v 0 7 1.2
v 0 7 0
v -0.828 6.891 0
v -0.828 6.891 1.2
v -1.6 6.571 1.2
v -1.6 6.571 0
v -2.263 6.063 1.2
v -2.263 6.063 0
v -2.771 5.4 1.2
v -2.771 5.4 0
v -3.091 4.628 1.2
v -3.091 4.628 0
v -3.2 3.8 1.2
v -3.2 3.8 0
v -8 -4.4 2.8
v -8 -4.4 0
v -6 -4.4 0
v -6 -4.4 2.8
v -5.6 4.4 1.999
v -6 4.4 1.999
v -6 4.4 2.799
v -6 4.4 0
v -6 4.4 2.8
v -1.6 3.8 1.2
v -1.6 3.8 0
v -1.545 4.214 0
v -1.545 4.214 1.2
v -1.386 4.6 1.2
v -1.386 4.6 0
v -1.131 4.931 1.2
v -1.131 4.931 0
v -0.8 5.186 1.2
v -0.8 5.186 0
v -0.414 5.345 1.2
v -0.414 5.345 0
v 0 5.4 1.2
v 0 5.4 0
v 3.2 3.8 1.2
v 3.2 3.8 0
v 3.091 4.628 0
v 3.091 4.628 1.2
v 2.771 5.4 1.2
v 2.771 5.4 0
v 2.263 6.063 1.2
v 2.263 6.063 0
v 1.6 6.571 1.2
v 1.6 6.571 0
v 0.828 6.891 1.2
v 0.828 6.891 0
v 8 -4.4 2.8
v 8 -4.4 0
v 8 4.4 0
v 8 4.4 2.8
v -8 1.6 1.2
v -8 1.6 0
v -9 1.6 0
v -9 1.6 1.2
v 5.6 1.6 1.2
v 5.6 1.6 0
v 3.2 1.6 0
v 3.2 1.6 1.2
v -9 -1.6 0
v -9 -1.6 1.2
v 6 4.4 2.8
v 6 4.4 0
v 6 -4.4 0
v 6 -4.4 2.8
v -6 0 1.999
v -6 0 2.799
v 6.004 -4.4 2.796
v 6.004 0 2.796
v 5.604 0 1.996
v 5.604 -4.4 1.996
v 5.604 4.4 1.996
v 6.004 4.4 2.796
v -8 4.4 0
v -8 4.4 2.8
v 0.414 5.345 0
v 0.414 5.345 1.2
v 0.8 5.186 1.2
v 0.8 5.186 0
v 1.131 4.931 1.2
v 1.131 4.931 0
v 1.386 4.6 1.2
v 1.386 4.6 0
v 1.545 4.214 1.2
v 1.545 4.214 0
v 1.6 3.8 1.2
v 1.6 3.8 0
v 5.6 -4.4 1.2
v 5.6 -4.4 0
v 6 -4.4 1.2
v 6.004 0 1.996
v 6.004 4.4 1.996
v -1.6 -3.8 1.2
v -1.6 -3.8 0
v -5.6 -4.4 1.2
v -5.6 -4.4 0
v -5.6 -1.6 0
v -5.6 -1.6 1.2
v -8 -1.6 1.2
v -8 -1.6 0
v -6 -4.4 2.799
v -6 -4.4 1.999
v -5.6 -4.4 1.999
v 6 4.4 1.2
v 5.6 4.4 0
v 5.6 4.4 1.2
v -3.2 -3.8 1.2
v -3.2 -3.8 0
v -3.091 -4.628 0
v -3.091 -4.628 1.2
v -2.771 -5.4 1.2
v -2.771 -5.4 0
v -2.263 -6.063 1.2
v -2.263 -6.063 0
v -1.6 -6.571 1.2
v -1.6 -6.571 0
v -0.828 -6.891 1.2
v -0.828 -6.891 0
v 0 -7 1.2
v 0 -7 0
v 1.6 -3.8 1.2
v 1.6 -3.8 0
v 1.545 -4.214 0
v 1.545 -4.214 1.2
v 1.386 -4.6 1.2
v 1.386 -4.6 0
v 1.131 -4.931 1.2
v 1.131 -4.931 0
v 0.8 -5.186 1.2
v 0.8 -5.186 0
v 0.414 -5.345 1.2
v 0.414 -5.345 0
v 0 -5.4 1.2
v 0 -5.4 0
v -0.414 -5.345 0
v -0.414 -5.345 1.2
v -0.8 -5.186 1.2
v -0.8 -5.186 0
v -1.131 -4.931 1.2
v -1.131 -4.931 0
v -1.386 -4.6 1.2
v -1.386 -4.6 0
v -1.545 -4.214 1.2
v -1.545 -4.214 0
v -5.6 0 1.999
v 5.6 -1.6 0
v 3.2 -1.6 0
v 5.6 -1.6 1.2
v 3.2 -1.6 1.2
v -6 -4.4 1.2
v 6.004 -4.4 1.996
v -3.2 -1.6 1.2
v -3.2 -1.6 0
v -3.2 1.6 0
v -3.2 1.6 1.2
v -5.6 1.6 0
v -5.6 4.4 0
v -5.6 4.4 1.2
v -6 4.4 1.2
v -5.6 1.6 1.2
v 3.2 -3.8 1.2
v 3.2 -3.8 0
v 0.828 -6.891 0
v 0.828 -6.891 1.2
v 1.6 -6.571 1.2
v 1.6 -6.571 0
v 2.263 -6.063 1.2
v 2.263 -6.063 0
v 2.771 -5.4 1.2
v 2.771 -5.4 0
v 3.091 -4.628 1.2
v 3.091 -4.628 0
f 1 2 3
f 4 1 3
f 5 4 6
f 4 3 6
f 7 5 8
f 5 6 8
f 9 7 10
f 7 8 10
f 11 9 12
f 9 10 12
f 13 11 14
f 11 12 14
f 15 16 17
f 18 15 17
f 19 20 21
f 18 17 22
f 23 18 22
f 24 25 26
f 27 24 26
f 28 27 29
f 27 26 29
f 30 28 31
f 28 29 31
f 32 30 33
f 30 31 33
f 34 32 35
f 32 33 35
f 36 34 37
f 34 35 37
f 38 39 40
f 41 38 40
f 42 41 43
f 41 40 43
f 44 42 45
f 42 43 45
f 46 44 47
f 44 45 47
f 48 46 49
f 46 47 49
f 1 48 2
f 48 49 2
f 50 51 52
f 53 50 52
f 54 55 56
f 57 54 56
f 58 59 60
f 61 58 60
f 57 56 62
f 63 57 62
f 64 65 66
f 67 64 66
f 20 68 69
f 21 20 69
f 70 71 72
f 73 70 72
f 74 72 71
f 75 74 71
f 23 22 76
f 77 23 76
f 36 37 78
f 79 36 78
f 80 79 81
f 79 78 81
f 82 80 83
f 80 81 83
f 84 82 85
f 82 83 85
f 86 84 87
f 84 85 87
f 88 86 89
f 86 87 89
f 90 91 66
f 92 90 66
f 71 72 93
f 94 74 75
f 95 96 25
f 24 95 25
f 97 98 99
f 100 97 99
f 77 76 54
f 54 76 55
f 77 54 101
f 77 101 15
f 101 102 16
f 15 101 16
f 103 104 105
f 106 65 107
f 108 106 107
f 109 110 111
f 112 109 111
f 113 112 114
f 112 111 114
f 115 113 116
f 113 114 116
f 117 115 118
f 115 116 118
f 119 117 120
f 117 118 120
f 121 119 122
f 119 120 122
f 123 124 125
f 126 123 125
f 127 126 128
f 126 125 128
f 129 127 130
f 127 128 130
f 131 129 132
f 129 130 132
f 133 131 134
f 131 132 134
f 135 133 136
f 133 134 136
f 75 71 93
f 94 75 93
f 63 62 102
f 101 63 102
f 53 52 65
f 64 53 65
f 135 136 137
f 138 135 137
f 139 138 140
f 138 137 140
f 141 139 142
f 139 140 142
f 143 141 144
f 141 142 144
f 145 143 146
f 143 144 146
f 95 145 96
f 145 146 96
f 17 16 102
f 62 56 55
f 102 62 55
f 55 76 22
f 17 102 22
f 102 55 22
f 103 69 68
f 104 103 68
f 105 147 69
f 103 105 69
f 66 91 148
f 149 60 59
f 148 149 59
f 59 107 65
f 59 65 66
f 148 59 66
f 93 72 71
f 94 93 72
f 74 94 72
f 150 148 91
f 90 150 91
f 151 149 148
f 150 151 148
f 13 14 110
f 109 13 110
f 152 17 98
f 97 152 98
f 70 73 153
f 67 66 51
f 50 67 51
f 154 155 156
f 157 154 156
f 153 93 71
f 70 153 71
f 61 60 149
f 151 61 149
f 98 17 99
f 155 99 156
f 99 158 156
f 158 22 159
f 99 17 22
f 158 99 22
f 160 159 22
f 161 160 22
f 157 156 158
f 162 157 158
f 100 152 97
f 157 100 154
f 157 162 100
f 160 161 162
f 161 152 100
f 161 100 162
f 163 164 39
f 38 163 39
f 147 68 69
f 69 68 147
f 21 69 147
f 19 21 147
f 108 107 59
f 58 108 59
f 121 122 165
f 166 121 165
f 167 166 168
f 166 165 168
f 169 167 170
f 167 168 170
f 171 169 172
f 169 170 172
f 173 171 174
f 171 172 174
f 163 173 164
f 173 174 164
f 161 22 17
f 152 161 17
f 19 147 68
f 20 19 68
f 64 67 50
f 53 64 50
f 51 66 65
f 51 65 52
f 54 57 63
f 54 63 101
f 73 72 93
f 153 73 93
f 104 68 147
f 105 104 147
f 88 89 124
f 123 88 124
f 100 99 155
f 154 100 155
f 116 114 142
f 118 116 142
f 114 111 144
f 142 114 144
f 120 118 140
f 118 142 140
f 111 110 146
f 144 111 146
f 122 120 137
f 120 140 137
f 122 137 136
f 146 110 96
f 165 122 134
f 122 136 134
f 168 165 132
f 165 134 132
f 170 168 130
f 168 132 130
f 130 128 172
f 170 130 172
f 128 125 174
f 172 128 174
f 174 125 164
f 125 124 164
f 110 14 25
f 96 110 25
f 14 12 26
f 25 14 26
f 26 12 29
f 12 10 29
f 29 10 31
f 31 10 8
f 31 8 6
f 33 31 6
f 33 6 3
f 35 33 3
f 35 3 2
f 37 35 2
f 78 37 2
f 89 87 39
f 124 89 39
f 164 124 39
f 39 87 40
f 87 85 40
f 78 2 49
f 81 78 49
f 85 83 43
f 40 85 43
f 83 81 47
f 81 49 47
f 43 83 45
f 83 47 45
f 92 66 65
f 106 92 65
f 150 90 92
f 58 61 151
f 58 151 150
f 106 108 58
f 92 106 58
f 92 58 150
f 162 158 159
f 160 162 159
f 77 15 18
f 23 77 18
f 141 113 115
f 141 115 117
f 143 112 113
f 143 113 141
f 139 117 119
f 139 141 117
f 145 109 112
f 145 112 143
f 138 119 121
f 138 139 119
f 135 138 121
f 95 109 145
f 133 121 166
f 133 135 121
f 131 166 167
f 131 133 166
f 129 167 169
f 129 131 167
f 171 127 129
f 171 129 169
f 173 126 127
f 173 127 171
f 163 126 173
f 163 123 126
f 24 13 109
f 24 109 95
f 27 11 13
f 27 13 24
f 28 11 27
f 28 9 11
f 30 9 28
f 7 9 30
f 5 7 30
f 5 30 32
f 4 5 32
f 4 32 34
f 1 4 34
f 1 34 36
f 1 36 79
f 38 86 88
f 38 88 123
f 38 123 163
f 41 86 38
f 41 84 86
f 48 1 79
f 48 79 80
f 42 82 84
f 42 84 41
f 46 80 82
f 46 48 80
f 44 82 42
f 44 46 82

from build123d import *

# Parameters (mm, degrees)
F1_DEPTH = 2.8
F2_DEPTH = 1.2
F4_DEPTH = 4.4
F5_DEPTH = 4.4
F6_DEPTH = 1.2
F7_DEPTH = 1.2


with BuildPart() as f1:
    # F0 (on Top) → F1 (new body)
    with BuildSketch(Plane.XY):
        Polygon((8, 4.4), (6, 4.4), (6, -4.4), (8, -4.4), (8, 0), align=None)
        Polygon((-6, 4.4), (-8, 4.4), (-8, 1.6), (-8, 0), (-8, -1.6), (-8, -4.4), (-6, -4.4), align=None)
    extrude(amount=F1_DEPTH)

    # F0 (on Top) → F6 (join)
    with BuildSketch(Plane.XY):
        Polygon((-8, 0), (-8, 1.6), (-9, 1.6), (-9, -1.6), (-8, -1.6), align=None)
    extrude(amount=F6_DEPTH)


with BuildPart() as f2:
    # F0 (on Top) → F2 (new body)
    with BuildSketch(Plane.XY):
        with BuildLine():
            Line((-3.2, 3.8), (-3.2, 1.6))
            Line((-3.2, 1.6), (-3.2, -1.6))
            Line((-3.2, -1.6), (-3.2, -3.8))
            ThreePointArc((-3.2, -3.8), (-2.262742, -6.062742), (0, -7))
            ThreePointArc((0, -7), (2.262742, -6.062742), (3.2, -3.8))
            Line((3.2, -3.8), (3.2, -1.6))
            Line((3.2, -1.6), (3.2, 1.6))
            Line((3.2, 1.6), (3.2, 3.8))
            ThreePointArc((3.2, 3.8), (2.262742, 6.062742), (0, 7))
            ThreePointArc((0, 7), (-2.262742, 6.062742), (-3.2, 3.8))
        make_face()
        with BuildLine():
            Line((-1.6, -3.8), (-1.6, 0))
            Line((-1.6, 0), (-1.6, 3.8))
            ThreePointArc((-1.6, 3.8), (-1.131371, 4.931371), (0, 5.4))
            ThreePointArc((0, 5.4), (1.131371, 4.931371), (1.6, 3.8))
            Line((1.6, 3.8), (1.6, 0))
            Line((1.6, 0), (1.6, -3.8))
            ThreePointArc((1.6, -3.8), (1.131371, -4.931371), (0, -5.4))
            ThreePointArc((0, -5.4), (-1.131371, -4.931371), (-1.6, -3.8))
        make_face(mode=Mode.SUBTRACT)
    extrude(amount=F2_DEPTH)


with BuildPart() as f4:
    # F3 (on Front) → F4 (new body)
    with BuildSketch(Plane.XZ):
        Polygon((-5.600426, 1.99909), (-6.000426, 2.79909), (-6.000426, 1.99909), align=None)
        Polygon((6.003734, 1.995533), (6.003734, 2.795533), (5.603734, 1.995533), align=None)
    extrude(amount=F4_DEPTH)


with BuildPart() as f5:
    # F4_face (on face) → F5 (new body)
    with BuildSketch(Plane(origin=(-5.867093, 0, 2.265757), x_dir=(1, 0, 0), z_dir=(0, 1, 0))):
        Polygon((-0.133333, -0.533333), (0.266667, 0.266667), (-0.133333, 0.266667), align=None)
        Polygon((11.870827, -0.529776), (11.870827, 0.270224), (11.470827, 0.270224), align=None)
    extrude(amount=F5_DEPTH)


with BuildPart() as f7:
    # F0 (on Top) → F7 (new body)
    with BuildSketch(Plane.XY):
        Polygon((5.6, 1.6), (3.2, 1.6), (3.2, -1.6), (5.6, -1.6), (5.6, -4.4), (6, -4.4), (6, 4.4), (5.6, 4.4), align=None)
        Polygon((-5.6, 4.4), (-6, 4.4), (-6, -4.4), (-5.6, -4.4), (-5.6, -1.6), (-3.2, -1.6), (-3.2, 1.6), (-5.6, 1.6), align=None)
    extrude(amount=F7_DEPTH)


solid = Compound([f1.part, f2.part, f4.part, f5.part, f7.part])
